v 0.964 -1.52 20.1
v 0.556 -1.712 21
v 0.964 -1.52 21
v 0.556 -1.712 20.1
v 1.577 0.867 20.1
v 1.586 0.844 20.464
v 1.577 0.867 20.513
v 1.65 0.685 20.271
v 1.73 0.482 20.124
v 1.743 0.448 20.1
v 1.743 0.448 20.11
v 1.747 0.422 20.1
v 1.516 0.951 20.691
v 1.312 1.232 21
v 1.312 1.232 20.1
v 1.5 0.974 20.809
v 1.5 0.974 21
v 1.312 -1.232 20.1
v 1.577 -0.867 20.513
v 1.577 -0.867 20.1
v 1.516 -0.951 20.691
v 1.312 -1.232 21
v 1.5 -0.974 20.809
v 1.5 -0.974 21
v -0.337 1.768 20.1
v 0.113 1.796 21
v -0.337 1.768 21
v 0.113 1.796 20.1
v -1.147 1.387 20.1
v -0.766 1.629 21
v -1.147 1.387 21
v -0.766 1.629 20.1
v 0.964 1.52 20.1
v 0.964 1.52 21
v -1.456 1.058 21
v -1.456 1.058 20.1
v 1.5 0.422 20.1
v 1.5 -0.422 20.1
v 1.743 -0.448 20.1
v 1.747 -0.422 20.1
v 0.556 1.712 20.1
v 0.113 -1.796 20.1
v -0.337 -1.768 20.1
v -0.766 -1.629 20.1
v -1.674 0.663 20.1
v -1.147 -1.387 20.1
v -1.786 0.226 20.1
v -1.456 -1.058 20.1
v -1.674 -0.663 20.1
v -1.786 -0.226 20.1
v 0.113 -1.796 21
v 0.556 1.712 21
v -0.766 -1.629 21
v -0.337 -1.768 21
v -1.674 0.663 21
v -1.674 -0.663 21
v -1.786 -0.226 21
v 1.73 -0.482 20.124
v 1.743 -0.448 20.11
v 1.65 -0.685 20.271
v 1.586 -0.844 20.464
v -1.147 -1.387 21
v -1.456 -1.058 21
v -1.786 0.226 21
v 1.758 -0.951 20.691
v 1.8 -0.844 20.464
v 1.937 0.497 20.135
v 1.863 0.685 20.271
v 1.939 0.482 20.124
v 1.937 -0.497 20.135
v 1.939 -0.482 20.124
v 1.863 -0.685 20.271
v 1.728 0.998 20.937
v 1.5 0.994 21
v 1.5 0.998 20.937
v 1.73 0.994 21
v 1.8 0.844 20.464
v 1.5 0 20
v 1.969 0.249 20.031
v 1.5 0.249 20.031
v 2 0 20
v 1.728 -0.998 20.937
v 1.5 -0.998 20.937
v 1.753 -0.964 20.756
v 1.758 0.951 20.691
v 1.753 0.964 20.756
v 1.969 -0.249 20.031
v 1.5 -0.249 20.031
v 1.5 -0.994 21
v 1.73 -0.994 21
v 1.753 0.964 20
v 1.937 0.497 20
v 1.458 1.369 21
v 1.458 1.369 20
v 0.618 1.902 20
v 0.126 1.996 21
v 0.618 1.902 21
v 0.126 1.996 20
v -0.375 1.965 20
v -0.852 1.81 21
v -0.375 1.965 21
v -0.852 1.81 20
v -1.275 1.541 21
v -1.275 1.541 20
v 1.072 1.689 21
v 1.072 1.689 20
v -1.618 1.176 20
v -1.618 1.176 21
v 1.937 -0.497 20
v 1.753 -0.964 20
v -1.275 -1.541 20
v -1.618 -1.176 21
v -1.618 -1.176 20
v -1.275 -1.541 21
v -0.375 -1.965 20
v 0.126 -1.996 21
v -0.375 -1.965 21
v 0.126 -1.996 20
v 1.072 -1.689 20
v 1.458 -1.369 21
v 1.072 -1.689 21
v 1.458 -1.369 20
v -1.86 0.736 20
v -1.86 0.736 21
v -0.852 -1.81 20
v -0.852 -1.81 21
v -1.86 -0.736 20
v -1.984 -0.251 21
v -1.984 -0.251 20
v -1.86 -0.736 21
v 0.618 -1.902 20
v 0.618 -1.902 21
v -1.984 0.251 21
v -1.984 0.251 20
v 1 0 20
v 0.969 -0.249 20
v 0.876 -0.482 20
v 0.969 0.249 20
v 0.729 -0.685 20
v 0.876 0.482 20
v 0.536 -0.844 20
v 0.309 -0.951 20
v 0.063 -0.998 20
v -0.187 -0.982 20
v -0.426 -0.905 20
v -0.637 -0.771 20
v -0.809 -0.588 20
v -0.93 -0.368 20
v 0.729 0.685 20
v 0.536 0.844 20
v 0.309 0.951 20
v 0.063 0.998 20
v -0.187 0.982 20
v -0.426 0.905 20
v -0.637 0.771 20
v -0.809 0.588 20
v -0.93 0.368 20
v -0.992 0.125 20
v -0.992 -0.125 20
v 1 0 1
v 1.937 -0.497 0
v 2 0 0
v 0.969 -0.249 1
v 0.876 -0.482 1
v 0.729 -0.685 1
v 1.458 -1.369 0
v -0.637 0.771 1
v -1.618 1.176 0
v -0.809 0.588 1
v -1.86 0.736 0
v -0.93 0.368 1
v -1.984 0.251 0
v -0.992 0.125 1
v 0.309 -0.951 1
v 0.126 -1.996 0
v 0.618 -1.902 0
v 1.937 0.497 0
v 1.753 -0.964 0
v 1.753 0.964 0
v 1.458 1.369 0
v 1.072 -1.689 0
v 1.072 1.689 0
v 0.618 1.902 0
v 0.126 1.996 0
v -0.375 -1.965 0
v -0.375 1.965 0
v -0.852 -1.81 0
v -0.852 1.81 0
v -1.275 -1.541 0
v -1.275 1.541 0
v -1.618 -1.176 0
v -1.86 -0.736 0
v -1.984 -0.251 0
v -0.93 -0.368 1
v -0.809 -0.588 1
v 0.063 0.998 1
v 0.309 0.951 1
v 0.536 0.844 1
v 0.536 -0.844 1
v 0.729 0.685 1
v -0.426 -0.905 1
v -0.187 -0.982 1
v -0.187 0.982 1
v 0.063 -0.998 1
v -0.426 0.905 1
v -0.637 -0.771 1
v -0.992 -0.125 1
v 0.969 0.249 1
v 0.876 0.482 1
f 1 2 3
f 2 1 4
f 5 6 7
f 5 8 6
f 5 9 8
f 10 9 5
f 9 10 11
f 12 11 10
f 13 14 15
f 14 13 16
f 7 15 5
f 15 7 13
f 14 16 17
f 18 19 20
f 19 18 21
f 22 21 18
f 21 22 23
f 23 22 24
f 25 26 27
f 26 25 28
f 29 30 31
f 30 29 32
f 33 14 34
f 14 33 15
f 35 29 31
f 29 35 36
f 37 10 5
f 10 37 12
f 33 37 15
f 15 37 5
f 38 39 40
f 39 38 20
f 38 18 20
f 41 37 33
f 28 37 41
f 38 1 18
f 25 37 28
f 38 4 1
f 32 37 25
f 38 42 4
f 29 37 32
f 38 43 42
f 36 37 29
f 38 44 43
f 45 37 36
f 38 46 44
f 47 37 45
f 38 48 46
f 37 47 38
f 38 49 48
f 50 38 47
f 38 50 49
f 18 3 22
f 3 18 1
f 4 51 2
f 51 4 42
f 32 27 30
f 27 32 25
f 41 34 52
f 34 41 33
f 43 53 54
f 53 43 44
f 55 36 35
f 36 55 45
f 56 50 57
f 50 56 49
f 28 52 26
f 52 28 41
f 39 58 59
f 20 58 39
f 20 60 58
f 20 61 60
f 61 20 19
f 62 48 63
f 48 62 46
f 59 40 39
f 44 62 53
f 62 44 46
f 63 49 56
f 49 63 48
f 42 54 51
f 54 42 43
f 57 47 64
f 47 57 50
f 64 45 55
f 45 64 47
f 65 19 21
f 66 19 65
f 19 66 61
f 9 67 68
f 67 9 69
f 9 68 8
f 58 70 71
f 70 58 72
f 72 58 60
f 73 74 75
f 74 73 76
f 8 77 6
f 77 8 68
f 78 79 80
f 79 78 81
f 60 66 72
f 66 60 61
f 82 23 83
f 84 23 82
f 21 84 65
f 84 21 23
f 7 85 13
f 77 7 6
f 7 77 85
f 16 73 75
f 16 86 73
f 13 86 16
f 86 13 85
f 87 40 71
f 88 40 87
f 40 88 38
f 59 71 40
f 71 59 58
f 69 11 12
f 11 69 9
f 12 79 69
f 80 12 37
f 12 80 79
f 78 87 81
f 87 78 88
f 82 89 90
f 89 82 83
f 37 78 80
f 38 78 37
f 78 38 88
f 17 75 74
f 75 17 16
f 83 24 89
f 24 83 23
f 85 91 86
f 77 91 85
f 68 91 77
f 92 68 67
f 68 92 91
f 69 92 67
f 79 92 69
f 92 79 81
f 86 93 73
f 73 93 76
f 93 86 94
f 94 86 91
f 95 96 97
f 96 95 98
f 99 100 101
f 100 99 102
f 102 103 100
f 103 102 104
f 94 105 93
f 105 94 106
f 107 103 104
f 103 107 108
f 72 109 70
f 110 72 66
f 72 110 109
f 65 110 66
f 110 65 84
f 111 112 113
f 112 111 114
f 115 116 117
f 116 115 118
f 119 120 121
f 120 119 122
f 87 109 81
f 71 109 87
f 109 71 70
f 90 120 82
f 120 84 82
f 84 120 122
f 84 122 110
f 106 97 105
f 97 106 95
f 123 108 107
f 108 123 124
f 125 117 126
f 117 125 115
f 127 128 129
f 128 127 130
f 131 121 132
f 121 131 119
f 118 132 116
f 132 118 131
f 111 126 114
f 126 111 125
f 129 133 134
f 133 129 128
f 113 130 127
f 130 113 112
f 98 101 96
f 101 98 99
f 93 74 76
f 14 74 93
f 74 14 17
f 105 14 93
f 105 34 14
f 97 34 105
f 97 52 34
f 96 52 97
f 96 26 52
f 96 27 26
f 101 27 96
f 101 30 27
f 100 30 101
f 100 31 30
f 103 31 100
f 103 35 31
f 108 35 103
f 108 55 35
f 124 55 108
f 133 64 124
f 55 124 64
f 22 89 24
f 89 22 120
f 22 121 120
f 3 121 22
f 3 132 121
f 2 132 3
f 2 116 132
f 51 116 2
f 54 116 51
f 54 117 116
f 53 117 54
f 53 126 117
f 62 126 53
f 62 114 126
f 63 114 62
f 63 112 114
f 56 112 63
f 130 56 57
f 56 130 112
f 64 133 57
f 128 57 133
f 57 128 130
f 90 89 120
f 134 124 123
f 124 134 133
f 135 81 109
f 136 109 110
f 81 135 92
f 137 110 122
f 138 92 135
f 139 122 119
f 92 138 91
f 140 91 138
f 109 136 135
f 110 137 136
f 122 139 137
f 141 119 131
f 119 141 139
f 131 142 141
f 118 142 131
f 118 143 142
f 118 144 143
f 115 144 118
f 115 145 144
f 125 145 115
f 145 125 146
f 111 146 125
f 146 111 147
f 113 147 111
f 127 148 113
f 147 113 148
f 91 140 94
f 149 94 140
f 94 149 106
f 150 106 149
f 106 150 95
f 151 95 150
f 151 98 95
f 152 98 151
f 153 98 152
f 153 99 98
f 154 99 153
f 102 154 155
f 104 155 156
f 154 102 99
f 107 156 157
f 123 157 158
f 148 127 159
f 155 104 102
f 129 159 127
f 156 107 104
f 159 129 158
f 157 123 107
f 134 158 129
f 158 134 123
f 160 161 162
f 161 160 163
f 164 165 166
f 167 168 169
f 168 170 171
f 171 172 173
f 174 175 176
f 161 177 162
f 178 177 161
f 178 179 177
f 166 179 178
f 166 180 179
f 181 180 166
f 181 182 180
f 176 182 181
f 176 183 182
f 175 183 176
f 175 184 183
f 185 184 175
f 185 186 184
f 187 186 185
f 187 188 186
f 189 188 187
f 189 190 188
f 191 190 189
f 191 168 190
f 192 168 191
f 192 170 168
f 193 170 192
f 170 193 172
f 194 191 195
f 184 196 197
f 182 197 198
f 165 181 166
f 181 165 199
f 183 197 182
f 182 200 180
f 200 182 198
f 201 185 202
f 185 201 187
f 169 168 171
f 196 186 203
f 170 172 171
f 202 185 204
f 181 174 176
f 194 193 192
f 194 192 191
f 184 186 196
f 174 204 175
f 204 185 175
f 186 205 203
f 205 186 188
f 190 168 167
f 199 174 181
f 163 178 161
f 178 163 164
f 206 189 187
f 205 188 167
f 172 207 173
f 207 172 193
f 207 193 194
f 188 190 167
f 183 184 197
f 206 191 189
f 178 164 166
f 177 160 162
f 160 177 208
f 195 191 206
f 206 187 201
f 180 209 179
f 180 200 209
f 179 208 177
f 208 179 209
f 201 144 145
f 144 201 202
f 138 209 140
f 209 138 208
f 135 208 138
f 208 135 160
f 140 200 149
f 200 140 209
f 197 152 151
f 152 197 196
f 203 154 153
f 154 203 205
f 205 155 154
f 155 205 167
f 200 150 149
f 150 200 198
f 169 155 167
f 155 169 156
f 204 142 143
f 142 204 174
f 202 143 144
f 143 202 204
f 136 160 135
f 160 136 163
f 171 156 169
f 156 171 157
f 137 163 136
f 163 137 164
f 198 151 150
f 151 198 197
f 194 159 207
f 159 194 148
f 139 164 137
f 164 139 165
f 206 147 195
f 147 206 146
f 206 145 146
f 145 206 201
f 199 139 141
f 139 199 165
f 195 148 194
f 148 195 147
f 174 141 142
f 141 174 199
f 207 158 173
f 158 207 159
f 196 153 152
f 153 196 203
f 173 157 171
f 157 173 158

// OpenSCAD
// file: container.scad
module container(h=1,r=1,angle=0,$fn=$fn){
    rotate([0,0,angle])
    difference(){
        cylinder(h,r=r*2);
        union(){
            translate([0,0,0.1])
            cylinder(h+1,r=r*2*0.9);
            translate([r*1.5,0,h])
            rotate([0,90,0])
            cylinder(r=r);
        }
    }
}


container(1,1,180,25);
// file: base.scad
module base(r,h,$fn=$fn) {
    linear_extrude(h,scale = 0.5) {
        circle(r*2);
    }
}

base(1,1);
// main file
use <base.scad>
use <container.scad>

$fn = 25;

module start(h=20,r=1,bh=1,angle=0,$fn=$fn){
    base(bh,r);
    translate([0,0,bh])
    cylinder(h-bh,r=r);
    translate([0,0,h])
    container(bh,r,angle);
}
start(angle=0);
